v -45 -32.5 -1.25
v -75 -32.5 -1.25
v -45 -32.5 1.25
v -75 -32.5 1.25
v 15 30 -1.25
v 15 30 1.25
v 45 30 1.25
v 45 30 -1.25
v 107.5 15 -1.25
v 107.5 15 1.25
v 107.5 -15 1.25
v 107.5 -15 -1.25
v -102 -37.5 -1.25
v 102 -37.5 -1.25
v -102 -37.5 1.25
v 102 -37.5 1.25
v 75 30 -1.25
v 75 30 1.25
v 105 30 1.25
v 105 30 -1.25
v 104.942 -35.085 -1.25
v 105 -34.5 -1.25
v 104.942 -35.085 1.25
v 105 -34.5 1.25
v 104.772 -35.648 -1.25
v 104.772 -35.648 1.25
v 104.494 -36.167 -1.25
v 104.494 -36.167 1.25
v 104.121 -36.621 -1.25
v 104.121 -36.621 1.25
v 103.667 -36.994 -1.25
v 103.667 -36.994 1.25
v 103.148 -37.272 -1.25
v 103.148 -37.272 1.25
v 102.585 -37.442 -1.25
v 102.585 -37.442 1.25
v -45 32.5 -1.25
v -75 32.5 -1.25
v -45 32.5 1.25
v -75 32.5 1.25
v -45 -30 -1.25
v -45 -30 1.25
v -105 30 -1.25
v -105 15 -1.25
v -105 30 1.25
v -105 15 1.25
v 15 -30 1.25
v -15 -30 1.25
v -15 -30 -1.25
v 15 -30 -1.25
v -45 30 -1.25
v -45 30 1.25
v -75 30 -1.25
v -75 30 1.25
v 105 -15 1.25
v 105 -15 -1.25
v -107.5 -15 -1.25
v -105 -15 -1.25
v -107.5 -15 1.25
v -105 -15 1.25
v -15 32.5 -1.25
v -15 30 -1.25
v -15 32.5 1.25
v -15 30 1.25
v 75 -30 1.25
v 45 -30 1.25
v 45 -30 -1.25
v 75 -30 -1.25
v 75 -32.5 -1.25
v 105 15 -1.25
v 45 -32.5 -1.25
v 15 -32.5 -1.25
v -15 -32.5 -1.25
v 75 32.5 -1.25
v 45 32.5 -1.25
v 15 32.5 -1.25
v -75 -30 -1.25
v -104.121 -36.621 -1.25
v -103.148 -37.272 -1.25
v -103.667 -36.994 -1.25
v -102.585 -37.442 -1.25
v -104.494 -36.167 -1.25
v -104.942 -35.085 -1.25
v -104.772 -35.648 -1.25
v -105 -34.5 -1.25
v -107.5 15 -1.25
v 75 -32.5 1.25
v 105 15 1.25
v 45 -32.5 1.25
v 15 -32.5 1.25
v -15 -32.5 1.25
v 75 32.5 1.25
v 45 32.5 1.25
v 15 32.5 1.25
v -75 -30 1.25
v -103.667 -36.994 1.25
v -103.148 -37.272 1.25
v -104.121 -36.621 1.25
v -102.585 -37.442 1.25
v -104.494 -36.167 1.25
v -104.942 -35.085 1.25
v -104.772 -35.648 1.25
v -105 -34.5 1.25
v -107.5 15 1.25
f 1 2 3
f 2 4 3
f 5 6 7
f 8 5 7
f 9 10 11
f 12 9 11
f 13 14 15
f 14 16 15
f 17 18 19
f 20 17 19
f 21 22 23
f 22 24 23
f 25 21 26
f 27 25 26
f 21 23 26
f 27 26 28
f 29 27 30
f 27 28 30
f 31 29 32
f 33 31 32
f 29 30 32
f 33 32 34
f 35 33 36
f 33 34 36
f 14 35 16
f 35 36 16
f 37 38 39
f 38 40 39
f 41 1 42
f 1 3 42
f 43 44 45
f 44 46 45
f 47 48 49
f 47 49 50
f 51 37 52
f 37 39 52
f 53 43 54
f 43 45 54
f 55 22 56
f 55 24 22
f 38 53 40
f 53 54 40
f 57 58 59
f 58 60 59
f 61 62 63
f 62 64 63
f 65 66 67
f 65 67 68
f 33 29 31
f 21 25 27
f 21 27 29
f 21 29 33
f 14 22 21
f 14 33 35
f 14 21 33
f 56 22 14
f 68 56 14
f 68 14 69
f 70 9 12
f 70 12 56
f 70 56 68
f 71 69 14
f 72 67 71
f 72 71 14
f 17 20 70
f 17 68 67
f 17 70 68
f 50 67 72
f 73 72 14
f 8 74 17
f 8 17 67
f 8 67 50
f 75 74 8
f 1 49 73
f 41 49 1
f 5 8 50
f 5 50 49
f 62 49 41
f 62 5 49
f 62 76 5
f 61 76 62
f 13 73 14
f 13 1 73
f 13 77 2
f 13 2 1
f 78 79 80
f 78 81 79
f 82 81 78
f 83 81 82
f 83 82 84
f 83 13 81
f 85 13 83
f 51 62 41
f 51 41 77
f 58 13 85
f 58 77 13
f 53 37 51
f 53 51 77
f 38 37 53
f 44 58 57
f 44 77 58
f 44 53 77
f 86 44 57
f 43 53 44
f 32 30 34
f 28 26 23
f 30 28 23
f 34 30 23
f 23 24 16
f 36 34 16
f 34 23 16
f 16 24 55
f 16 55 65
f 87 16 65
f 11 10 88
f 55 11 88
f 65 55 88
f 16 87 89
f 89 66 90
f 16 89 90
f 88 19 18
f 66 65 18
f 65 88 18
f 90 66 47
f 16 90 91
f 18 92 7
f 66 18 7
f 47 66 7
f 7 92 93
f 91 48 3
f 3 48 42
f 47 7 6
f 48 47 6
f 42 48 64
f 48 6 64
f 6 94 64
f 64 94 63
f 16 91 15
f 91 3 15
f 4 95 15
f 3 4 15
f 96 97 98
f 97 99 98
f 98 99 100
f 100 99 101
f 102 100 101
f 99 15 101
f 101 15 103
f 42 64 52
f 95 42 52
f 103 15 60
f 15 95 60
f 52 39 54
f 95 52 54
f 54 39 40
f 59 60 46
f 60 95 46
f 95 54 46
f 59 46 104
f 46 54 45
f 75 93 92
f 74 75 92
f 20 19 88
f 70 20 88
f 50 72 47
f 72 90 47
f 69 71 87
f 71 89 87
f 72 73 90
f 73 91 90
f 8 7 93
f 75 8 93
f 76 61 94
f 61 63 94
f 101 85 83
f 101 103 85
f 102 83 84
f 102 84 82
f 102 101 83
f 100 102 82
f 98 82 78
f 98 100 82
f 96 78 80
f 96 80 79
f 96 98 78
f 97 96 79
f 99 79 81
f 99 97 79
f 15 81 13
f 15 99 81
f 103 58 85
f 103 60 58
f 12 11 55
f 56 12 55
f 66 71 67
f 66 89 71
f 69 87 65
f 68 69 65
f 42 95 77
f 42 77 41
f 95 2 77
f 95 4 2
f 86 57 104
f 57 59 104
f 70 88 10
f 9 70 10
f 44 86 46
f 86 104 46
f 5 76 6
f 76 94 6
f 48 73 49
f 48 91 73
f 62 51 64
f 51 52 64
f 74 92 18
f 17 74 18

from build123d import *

# Parameters (mm, degrees)
SKETCH1_W           = 30
SKETCH1_H           = 2.5
BOSS_EXTRUDE1_DEPTH = 1.25
FILLET1_R           = 3


with BuildPart() as part:
    # Sketch1 → Boss-Extrude1 (new, symmetric)
    with BuildSketch(Plane.XY):
        Polygon((-105, -37.5), (-105, -30), (-105, -15), (-107.5, -15), (-107.5, 15), (-105, 15), (-105, 30), (-75, 30), (-75, 32.5), (-45, 32.5), (-45, 30), (-15, 30), (-15, 32.5), (15, 32.5), (15, 30), (45, 30), (45, 32.5), (75, 32.5), (75, 30), (105, 30), (105, 15), (107.5, 15), (107.5, -15), (105, -15), (105, -30), (105, -37.5), align=None)
        with Locations((-60, -31.25)):
            Rectangle(SKETCH1_W, SKETCH1_H, mode=Mode.SUBTRACT)
        with Locations((0, -31.25)):
            Rectangle(SKETCH1_W, SKETCH1_H, mode=Mode.SUBTRACT)
        with Locations((60, -31.25)):
            Rectangle(SKETCH1_W, SKETCH1_H, mode=Mode.SUBTRACT)
    extrude(amount=BOSS_EXTRUDE1_DEPTH, both=True)

    # Fillet1
    fillet1_edges = [part.edges().sort_by_distance(p)[0] for p in [
        (105, -37.5, 0),
        (-105, -37.5, 0),
    ]]
    fillet(fillet1_edges, radius=FILLET1_R)


solid = part.part
